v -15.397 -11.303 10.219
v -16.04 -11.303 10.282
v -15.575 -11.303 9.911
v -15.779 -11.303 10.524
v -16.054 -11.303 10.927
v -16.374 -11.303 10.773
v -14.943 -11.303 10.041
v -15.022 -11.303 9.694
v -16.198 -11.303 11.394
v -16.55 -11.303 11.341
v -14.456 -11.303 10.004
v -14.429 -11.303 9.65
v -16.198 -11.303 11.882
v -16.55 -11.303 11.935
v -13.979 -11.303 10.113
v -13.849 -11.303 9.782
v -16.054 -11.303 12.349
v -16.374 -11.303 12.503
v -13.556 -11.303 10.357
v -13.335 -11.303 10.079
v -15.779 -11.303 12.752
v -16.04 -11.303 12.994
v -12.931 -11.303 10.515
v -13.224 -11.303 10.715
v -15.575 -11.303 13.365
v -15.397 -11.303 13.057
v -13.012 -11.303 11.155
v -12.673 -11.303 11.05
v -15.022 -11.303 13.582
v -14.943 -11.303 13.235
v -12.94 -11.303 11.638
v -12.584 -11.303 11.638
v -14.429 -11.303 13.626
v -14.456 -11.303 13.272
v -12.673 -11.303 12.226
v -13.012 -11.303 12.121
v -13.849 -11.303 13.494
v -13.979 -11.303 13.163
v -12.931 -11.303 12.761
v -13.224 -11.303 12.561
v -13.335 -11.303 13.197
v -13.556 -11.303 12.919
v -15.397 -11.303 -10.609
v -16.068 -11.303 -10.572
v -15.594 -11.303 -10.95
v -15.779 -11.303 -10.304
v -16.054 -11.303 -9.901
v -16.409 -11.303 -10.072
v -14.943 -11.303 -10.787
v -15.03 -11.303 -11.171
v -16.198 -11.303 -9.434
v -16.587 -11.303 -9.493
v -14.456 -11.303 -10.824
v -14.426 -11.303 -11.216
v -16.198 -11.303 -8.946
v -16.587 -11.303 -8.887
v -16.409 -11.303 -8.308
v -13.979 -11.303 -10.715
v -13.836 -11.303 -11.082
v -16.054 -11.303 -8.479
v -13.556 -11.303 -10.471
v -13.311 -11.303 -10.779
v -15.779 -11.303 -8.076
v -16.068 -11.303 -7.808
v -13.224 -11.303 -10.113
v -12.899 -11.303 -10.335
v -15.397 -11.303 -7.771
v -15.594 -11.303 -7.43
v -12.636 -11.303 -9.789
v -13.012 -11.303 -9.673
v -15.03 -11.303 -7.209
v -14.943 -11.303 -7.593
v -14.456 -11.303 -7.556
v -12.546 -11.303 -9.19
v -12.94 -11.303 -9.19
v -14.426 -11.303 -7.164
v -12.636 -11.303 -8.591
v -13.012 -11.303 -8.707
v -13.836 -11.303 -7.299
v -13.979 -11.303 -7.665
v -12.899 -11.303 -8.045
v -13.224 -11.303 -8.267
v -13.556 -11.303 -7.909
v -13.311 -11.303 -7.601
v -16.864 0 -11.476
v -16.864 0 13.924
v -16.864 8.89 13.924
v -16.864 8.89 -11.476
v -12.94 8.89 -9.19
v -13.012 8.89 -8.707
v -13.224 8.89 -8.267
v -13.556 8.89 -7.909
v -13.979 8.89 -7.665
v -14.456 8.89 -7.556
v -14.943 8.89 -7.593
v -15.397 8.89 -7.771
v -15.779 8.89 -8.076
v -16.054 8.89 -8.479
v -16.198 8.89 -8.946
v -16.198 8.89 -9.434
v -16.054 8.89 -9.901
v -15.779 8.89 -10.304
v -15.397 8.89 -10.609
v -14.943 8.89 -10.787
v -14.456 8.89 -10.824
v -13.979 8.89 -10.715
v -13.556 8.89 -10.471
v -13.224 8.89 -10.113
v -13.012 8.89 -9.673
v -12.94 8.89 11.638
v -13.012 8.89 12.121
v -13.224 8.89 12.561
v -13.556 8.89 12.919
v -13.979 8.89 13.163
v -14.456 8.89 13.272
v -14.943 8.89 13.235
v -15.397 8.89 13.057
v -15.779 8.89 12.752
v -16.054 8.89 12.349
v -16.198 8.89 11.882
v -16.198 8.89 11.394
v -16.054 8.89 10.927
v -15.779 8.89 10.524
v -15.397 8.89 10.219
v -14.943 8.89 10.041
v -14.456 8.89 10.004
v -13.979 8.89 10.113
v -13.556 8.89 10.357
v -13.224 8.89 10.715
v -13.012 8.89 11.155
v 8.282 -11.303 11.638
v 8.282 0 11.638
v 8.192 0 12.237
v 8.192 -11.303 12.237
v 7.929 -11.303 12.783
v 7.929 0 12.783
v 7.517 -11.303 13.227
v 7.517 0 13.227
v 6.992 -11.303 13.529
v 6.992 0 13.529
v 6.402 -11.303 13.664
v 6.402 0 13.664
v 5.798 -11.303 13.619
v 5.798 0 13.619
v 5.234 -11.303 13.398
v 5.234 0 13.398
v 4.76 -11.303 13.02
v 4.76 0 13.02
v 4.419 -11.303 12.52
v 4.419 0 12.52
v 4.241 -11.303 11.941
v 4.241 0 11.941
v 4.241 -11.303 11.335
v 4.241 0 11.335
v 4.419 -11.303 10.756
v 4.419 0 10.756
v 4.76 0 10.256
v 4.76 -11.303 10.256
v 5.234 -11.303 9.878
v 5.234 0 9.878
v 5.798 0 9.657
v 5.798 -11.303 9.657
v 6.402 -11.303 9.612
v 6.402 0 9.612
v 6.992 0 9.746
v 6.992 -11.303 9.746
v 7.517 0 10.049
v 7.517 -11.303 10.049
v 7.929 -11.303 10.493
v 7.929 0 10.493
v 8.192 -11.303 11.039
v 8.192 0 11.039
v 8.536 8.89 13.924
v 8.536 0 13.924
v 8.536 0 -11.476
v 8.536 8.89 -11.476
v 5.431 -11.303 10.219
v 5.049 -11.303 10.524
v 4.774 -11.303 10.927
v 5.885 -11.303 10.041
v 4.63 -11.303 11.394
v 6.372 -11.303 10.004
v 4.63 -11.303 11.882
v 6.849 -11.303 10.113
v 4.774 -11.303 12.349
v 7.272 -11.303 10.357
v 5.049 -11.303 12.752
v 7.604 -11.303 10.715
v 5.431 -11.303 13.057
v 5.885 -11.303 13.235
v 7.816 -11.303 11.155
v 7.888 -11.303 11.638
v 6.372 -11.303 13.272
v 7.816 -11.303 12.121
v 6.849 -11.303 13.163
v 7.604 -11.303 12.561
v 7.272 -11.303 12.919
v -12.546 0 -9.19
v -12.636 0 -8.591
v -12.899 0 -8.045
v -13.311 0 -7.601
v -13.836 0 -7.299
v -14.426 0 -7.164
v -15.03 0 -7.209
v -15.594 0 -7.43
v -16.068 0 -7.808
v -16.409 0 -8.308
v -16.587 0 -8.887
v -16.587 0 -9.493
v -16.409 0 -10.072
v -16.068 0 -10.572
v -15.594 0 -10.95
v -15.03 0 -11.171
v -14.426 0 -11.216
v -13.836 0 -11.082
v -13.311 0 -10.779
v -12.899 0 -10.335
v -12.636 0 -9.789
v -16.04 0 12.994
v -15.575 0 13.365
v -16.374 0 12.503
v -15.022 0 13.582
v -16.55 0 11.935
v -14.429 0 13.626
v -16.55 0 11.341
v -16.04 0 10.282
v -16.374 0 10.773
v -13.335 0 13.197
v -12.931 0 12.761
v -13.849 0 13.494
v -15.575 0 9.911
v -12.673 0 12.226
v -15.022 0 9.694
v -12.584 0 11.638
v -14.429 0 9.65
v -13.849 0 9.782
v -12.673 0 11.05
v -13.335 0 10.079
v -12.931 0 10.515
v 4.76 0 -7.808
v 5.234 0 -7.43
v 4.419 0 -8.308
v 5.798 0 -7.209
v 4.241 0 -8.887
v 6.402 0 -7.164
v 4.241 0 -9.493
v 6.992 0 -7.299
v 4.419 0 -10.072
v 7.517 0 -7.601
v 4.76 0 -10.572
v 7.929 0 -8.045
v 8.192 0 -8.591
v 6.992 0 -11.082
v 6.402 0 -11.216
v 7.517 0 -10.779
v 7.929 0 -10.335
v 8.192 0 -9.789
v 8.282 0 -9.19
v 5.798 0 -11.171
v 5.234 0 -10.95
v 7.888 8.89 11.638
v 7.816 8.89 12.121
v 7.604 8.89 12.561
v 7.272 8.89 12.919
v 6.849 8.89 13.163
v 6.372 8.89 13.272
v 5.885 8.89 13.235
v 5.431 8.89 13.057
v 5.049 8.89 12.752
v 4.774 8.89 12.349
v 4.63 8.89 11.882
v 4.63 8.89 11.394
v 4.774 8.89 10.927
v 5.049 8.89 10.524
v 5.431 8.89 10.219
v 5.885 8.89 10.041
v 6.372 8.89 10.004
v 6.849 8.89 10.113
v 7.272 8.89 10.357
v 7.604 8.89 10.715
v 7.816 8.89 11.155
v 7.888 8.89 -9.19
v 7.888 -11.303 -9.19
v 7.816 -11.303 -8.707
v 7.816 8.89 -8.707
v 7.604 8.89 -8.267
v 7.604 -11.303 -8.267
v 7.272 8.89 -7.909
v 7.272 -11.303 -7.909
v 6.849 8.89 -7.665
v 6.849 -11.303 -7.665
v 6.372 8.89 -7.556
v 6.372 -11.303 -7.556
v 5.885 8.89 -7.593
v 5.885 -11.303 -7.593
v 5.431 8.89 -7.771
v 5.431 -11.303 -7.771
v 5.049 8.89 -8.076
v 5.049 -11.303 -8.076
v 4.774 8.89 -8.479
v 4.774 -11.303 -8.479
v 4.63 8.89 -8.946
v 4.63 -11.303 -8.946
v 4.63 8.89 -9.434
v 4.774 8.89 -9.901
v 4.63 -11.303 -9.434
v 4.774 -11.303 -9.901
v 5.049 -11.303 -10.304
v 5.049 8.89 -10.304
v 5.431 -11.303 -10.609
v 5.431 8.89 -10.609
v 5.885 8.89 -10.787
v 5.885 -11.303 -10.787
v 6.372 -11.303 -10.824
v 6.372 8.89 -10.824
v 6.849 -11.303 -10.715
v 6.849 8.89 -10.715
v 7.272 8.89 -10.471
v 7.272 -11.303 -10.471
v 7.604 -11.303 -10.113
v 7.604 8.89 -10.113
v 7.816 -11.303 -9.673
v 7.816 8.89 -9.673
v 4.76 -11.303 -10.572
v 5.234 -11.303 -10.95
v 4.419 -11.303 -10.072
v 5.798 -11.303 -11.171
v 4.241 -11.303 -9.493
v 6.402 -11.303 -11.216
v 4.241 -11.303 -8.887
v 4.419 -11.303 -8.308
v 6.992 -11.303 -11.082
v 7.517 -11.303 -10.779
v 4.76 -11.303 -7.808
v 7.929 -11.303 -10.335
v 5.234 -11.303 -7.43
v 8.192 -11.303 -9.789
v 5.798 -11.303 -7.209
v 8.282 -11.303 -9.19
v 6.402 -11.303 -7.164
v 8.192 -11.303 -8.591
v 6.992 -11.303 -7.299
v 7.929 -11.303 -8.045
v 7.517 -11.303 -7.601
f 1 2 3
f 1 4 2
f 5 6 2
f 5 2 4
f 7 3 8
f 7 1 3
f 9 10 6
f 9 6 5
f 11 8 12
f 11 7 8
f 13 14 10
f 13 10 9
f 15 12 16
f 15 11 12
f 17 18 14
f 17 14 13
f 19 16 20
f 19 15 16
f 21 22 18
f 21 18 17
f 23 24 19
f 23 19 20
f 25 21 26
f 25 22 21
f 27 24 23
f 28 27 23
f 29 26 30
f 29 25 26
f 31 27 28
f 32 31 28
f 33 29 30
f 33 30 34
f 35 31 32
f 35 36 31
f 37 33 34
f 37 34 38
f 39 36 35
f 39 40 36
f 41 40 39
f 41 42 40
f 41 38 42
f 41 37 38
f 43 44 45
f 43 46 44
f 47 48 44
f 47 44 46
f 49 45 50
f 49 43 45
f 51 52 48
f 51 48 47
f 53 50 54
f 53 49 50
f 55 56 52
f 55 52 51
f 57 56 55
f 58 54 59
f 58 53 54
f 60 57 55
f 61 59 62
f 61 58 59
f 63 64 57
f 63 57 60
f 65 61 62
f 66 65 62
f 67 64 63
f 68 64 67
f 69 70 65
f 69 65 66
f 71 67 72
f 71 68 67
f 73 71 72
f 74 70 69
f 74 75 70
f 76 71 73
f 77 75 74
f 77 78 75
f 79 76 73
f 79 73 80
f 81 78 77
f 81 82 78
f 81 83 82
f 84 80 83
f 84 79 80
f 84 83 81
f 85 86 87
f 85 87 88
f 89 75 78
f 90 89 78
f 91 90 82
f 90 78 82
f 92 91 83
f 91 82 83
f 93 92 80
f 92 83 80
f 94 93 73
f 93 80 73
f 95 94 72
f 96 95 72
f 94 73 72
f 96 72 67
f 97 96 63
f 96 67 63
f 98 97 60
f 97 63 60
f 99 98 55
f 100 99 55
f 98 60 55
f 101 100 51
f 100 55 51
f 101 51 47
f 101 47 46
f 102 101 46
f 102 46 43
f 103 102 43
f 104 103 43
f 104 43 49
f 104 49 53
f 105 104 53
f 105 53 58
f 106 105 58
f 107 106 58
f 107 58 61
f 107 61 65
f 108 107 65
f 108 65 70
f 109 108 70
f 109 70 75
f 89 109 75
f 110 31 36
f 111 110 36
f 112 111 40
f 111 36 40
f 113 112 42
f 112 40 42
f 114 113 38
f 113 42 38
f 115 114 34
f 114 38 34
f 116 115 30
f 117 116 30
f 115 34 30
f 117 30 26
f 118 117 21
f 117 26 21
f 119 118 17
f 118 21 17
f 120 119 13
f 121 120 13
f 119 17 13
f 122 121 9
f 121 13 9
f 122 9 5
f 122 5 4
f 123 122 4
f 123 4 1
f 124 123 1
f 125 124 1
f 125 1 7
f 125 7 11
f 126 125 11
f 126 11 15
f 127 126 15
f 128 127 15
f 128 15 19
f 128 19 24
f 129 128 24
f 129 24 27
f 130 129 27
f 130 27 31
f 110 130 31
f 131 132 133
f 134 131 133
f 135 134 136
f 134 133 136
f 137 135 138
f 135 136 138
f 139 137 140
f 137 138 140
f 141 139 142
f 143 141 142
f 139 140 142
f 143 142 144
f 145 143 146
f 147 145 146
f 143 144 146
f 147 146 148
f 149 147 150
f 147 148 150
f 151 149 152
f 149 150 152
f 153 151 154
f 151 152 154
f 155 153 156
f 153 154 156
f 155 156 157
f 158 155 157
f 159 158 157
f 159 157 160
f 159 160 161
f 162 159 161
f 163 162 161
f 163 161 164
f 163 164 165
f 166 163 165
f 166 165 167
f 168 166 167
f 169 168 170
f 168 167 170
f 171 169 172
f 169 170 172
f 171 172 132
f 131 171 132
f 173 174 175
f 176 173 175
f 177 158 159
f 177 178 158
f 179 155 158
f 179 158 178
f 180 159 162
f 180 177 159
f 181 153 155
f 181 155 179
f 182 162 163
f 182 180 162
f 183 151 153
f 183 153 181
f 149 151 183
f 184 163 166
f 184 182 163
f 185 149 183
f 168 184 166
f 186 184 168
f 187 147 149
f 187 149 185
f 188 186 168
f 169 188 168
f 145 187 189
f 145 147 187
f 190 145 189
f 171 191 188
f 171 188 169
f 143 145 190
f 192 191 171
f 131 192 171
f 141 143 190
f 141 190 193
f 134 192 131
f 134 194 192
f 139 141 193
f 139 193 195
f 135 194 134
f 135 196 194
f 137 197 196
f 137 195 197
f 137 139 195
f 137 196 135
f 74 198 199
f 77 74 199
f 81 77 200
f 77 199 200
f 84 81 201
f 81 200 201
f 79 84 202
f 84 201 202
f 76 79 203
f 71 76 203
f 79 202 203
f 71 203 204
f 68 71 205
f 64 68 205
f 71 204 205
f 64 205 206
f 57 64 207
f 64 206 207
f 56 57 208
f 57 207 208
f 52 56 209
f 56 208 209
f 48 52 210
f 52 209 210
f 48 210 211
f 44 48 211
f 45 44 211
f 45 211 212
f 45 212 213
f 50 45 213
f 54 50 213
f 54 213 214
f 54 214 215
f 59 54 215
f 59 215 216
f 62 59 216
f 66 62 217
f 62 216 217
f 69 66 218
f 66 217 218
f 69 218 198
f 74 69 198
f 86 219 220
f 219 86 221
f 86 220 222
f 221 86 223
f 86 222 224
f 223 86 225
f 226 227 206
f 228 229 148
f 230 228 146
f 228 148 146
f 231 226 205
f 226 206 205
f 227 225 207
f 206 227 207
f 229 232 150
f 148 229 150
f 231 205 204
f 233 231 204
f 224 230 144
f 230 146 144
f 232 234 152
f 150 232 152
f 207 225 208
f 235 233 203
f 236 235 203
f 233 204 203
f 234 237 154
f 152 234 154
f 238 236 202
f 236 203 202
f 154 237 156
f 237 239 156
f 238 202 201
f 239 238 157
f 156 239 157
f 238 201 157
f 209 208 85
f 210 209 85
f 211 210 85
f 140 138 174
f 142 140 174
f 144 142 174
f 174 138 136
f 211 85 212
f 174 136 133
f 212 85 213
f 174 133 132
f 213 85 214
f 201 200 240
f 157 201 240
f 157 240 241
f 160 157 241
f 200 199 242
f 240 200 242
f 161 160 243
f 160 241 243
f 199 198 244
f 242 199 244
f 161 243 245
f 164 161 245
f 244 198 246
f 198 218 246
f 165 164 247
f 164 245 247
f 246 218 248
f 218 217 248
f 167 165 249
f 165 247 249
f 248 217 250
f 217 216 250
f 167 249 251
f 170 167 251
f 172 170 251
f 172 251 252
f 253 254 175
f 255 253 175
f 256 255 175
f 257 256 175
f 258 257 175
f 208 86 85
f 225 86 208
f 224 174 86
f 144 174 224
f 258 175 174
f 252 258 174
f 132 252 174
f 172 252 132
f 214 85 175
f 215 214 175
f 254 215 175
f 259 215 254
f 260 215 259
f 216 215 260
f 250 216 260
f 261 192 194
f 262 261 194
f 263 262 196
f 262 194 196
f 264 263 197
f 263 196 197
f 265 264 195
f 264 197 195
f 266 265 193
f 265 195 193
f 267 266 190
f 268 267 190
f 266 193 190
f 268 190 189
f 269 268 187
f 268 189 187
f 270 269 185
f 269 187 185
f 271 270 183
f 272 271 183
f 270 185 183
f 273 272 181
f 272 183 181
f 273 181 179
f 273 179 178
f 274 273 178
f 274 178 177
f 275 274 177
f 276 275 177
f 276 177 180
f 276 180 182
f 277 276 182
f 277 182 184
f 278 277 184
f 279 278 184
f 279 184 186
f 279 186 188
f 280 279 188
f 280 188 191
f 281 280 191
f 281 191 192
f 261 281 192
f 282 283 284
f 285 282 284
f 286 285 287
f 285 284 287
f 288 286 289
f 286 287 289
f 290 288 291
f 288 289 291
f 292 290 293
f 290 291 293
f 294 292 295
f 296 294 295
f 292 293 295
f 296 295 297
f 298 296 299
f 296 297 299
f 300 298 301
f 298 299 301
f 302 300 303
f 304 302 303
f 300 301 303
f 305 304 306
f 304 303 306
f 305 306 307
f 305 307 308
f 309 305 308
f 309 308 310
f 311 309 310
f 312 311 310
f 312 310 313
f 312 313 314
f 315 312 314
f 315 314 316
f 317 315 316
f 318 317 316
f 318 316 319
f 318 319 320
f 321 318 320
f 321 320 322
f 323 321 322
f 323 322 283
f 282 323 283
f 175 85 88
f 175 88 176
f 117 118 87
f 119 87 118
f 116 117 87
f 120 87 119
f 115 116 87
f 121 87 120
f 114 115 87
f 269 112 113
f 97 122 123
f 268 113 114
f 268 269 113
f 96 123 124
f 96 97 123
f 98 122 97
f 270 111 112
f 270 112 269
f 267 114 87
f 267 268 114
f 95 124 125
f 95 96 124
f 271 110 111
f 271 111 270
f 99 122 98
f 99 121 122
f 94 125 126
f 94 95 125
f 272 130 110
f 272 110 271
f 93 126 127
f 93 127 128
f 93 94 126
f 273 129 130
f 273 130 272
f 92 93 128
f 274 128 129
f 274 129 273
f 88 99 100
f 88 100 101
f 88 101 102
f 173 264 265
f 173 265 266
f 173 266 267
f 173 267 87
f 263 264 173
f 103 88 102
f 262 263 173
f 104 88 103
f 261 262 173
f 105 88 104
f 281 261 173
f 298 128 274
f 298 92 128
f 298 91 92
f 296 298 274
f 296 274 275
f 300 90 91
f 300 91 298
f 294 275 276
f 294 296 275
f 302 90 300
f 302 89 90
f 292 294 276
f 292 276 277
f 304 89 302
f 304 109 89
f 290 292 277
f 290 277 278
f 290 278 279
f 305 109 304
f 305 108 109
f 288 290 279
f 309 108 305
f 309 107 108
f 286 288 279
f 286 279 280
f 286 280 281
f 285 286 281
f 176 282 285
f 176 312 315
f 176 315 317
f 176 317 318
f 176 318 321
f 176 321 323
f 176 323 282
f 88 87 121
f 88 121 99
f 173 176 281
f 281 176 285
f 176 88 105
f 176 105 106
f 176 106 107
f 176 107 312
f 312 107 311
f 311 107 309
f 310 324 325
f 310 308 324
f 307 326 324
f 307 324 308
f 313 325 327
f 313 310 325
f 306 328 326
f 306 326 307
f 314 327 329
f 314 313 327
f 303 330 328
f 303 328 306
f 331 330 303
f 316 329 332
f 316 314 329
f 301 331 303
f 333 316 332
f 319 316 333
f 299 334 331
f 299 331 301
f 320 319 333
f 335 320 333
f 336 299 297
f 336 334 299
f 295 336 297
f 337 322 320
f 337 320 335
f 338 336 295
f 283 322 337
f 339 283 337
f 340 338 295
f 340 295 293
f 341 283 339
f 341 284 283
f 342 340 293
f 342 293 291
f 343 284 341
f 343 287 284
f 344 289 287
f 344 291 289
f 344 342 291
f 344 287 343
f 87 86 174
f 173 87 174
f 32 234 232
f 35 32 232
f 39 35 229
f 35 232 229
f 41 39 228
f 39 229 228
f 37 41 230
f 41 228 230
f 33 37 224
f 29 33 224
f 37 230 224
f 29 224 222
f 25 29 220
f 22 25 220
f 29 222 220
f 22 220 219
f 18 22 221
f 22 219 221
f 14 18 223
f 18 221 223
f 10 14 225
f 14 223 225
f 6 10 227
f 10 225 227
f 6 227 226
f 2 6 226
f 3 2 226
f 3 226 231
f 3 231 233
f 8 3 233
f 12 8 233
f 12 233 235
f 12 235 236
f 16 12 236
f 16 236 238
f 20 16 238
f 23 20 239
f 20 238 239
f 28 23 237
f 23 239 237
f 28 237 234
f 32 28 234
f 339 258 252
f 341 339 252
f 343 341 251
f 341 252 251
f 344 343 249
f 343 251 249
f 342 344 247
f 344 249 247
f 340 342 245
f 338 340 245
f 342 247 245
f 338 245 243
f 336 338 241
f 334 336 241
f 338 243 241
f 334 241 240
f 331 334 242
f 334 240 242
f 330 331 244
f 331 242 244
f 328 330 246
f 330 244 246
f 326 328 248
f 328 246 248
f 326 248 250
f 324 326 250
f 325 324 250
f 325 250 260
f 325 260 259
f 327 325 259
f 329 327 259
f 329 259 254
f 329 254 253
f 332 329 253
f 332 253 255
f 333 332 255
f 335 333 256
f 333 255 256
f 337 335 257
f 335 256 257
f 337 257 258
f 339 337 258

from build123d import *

# Parameters (mm, degrees)
SKETCH1_W           = 25.4
SKETCH1_H           = 25.4
BOSS_EXTRUDE1_DEPTH = 8.89
SKETCH2_R           = 1.9939
SKETCH2_R_2         = 2.032
BOSS_EXTRUDE2_DEPTH = 11.303
SKETCH3_R           = 1.6383
CUT_EXTRUDE1_DEPTH  = 21.193


with BuildPart() as part:
    # Sketch1 → Boss-Extrude1 (new body)
    with BuildSketch(Plane(origin=(0, 0, 0), x_dir=(1, 0, 0), z_dir=(0, 1, 0))):
        with Locations((-4.163944862, -1.223942607)):
            Rectangle(SKETCH1_W, SKETCH1_H)
    extrude(amount=BOSS_EXTRUDE1_DEPTH)

    # Sketch2 → Boss-Extrude2 (add)
    with BuildSketch(Plane.XZ):
        with Locations((-14.577944862, 11.637942607)):
            Circle(SKETCH2_R)
        with Locations((6.250055138, 11.637942607)):
            Circle(SKETCH2_R_2)
        with Locations((6.250055138, -9.190057393)):
            Circle(SKETCH2_R_2)
        with Locations((-14.577944862, -9.190057393)):
            Circle(SKETCH2_R_2)
    extrude(amount=BOSS_EXTRUDE2_DEPTH)

    # Sketch3 → Cut-Extrude1 (cut, through all)
    with BuildSketch(Plane.XZ.offset(11.303)):
        with Locations((-14.577944862, 11.637942607)):
            Circle(SKETCH3_R)
        with Locations((-14.577944862, -9.190057393)):
            Circle(SKETCH3_R)
        with Locations((6.250055138, -9.190057393)):
            Circle(SKETCH3_R)
        with Locations((6.250055138, 11.637942607)):
            Circle(SKETCH3_R)
    extrude(amount=-CUT_EXTRUDE1_DEPTH, mode=Mode.SUBTRACT)


solid = part.part
